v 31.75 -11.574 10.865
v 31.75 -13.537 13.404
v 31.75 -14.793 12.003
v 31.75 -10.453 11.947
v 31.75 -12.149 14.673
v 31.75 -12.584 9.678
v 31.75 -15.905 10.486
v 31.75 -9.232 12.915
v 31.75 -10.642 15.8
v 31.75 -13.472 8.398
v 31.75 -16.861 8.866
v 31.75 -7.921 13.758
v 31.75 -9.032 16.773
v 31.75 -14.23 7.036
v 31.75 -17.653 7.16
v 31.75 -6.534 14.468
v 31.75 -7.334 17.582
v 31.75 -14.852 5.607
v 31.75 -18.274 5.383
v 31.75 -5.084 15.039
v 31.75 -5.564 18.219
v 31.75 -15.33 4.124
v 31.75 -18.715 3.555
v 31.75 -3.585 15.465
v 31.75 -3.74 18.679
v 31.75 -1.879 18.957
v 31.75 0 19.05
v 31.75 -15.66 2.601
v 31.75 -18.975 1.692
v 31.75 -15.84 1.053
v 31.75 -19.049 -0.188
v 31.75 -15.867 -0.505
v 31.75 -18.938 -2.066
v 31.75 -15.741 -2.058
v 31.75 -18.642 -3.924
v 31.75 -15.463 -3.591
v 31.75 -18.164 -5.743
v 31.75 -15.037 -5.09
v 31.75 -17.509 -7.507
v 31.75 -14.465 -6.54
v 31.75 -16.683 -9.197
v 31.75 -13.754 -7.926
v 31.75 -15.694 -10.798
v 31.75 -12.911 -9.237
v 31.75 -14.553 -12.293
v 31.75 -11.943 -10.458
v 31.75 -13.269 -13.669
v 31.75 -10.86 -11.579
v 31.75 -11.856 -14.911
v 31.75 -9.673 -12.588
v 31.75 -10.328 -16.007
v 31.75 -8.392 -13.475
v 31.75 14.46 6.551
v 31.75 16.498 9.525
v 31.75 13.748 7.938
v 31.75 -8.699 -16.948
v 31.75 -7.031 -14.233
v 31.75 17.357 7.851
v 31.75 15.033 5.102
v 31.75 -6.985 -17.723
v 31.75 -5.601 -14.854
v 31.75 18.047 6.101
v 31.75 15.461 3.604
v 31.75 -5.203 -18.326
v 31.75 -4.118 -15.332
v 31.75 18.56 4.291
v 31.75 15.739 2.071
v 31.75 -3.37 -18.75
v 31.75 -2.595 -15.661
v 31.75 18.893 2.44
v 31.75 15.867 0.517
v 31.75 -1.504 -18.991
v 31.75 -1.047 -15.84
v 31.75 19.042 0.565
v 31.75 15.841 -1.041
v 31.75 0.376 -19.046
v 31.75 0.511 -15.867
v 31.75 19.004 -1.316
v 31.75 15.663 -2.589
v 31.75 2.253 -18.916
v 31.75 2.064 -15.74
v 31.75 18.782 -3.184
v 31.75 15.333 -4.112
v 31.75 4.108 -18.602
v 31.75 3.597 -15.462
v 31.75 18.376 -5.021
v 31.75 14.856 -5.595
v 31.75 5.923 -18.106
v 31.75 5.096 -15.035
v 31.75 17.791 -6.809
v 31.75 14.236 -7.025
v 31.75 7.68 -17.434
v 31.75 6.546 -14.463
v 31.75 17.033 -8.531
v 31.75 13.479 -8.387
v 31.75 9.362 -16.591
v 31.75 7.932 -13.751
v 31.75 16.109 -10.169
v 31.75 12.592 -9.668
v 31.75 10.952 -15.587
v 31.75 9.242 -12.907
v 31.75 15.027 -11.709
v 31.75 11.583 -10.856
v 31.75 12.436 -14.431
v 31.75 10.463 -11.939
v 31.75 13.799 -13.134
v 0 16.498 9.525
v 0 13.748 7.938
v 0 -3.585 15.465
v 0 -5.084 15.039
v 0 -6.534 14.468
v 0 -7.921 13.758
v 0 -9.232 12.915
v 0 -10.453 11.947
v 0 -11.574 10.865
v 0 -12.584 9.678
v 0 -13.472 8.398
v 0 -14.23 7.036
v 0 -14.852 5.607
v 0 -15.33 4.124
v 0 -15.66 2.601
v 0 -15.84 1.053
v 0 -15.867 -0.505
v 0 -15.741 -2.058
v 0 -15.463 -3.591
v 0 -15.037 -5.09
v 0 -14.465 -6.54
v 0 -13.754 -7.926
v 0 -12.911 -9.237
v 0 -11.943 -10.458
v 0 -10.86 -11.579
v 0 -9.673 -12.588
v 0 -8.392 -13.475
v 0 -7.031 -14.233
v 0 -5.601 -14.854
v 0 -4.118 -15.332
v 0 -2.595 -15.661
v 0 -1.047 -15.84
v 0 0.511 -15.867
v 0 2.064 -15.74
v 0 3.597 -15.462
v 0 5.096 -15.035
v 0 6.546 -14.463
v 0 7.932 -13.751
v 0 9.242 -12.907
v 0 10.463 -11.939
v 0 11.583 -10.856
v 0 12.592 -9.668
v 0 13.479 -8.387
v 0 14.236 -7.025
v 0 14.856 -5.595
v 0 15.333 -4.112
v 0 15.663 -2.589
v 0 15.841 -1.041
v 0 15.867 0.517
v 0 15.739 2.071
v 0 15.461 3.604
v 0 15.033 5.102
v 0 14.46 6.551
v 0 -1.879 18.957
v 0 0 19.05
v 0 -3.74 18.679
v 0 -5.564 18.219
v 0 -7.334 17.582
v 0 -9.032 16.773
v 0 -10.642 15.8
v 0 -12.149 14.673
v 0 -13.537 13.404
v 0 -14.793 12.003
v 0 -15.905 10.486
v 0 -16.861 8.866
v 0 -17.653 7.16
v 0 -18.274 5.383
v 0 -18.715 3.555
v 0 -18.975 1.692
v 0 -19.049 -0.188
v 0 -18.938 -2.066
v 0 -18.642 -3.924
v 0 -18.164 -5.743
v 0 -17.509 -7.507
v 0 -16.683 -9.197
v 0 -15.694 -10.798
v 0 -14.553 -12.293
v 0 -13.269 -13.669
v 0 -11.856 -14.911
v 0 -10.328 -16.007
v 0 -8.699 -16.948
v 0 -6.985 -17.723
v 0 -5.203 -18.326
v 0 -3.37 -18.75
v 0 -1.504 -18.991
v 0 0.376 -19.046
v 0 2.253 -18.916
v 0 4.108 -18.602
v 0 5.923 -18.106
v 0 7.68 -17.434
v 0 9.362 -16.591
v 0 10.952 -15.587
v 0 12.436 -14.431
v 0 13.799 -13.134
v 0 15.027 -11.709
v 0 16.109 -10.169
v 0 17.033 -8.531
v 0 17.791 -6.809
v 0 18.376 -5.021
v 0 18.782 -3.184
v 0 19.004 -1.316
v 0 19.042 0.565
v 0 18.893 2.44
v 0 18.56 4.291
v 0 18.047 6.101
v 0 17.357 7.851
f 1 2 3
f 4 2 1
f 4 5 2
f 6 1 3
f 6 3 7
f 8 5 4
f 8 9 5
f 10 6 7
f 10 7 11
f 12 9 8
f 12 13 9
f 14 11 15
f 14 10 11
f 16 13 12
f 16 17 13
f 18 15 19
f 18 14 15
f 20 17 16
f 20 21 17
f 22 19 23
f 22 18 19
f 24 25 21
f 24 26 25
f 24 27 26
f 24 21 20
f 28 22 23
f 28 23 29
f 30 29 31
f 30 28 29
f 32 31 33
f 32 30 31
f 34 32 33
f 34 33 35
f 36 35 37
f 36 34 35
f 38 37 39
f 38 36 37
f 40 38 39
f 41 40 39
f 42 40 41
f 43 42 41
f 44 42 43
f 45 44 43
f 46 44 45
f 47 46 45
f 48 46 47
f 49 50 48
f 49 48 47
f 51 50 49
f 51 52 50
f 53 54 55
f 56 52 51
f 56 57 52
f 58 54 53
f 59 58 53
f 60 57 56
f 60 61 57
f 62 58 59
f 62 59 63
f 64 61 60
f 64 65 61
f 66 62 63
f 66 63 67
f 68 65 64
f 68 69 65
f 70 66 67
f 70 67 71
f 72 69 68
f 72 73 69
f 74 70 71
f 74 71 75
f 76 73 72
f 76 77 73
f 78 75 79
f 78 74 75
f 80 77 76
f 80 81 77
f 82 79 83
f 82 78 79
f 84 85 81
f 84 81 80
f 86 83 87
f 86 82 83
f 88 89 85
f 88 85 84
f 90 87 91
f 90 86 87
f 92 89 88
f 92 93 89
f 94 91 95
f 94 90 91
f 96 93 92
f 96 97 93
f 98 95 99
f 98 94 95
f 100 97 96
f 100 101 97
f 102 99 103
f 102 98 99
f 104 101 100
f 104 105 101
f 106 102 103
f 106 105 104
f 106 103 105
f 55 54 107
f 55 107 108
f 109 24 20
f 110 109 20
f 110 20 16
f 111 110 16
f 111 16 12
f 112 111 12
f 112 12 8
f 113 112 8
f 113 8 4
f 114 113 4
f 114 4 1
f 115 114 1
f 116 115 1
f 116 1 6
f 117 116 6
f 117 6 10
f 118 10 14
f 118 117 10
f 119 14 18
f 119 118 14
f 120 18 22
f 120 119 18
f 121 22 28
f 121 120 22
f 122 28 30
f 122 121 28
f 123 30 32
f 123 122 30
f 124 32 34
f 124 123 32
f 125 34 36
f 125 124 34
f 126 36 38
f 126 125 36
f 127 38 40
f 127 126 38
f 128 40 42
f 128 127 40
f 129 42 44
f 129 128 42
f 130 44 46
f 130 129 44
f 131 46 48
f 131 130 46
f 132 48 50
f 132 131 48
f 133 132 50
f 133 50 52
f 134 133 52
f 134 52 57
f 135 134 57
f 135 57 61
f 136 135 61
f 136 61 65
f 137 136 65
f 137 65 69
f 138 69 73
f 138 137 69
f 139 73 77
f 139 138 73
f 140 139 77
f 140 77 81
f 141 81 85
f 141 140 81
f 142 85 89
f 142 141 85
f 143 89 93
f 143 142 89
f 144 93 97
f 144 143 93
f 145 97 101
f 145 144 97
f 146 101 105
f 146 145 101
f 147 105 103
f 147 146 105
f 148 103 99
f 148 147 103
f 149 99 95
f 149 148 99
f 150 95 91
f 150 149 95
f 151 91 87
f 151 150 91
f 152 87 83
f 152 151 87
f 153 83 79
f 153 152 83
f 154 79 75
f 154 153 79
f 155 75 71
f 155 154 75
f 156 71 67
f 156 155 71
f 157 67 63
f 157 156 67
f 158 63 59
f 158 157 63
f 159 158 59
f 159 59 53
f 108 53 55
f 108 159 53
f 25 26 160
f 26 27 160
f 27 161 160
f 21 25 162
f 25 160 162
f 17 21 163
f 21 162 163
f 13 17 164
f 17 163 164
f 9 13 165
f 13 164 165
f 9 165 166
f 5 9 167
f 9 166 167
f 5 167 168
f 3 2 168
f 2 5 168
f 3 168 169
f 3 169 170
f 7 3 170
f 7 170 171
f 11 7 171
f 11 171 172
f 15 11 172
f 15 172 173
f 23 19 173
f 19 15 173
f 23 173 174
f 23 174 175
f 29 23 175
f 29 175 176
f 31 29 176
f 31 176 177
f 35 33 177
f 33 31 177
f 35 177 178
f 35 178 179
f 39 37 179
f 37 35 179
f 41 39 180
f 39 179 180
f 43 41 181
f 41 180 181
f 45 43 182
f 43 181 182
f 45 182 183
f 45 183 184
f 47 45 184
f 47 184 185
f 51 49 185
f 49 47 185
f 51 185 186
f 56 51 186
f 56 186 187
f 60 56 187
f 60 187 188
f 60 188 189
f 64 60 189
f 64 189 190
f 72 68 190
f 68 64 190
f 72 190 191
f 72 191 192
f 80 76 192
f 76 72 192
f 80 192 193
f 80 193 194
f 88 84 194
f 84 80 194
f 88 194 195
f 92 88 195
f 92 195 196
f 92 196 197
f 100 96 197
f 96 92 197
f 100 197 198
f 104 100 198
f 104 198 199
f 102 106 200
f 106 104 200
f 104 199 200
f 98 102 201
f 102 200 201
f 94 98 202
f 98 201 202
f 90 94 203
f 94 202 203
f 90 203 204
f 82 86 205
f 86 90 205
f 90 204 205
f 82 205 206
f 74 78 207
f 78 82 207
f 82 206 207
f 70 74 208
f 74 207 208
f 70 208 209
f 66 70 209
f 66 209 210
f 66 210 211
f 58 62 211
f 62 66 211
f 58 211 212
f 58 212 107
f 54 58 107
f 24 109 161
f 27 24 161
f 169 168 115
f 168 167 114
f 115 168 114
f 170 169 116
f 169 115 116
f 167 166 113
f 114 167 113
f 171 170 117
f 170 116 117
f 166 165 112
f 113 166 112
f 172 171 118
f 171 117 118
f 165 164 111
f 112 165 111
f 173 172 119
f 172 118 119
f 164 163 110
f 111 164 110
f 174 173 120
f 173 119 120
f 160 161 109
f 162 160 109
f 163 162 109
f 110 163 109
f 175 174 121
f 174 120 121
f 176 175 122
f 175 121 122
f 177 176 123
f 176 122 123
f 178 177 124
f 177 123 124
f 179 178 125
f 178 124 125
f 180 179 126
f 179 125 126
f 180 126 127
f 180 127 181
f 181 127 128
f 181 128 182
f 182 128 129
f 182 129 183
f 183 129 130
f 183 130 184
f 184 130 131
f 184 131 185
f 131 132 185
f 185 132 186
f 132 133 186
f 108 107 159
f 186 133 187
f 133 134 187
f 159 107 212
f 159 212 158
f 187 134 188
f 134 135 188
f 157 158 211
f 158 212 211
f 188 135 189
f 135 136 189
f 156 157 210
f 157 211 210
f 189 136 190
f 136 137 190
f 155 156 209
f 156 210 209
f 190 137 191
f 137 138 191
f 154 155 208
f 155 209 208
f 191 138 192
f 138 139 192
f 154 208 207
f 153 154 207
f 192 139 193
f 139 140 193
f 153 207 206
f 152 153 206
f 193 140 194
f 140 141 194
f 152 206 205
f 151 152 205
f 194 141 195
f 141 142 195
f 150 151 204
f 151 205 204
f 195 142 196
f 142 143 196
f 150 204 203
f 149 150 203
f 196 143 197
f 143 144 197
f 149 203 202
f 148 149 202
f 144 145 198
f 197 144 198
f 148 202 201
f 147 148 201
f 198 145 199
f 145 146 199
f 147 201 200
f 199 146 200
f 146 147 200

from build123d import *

# Parameters (mm, degrees)
SKETCH1_R           = 19.05
SKETCH1_R_2         = 15.875
BOSS_EXTRUDE1_DEPTH = 31.75
CUT_EXTRUDE2_DEPTH  = 32.75
CUT_EXTRUDE3_DEPTH  = 32.75


with BuildPart() as part:
    # Sketch1 → Boss-Extrude1 (new body)
    with BuildSketch(Plane(origin=(0, 0, 0), x_dir=(0, 0, -1), z_dir=(1, 0, 0))):
        Circle(SKETCH1_R)
        Circle(SKETCH1_R_2, mode=Mode.SUBTRACT)
    extrude(amount=BOSS_EXTRUDE1_DEPTH)

    # Sketch2 → Cut-Extrude2 (cut, through all)
    with BuildSketch(Plane(origin=(31.75, 0, 0), x_dir=(0, 0, -1), z_dir=(1, 0, 0))):
        with BuildLine():
            Line((-15.875, 0), (-19.05, 0))
            ThreePointArc((-19.05, 0), (-16.497783942, 9.525), (-9.525, 16.497783942))
            Line((-9.525, 16.497783942), (-7.9375, 13.748153285))
            ThreePointArc((-7.9375, 13.748153285), (-13.748153285, 7.9375), (-15.875, 0))
        make_face()
    extrude(amount=-CUT_EXTRUDE2_DEPTH, mode=Mode.SUBTRACT)

    # Sketch3 → Cut-Extrude3 (cut, through all)
    with BuildSketch(Plane(origin=(31.75, 0, 0), x_dir=(0, 0, -1), z_dir=(1, 0, 0))):
        with BuildLine():
            Line((-19.05, 0), (-15.875, 0))
            ThreePointArc((-15.875, 0), (-15.772137022, -1.804250192), (-15.464881102, -3.585118898))
            Line((-15.464881102, -3.585118898), (-19.05, 0))
        make_face()
    extrude(amount=-CUT_EXTRUDE3_DEPTH, mode=Mode.SUBTRACT)


solid = part.part
